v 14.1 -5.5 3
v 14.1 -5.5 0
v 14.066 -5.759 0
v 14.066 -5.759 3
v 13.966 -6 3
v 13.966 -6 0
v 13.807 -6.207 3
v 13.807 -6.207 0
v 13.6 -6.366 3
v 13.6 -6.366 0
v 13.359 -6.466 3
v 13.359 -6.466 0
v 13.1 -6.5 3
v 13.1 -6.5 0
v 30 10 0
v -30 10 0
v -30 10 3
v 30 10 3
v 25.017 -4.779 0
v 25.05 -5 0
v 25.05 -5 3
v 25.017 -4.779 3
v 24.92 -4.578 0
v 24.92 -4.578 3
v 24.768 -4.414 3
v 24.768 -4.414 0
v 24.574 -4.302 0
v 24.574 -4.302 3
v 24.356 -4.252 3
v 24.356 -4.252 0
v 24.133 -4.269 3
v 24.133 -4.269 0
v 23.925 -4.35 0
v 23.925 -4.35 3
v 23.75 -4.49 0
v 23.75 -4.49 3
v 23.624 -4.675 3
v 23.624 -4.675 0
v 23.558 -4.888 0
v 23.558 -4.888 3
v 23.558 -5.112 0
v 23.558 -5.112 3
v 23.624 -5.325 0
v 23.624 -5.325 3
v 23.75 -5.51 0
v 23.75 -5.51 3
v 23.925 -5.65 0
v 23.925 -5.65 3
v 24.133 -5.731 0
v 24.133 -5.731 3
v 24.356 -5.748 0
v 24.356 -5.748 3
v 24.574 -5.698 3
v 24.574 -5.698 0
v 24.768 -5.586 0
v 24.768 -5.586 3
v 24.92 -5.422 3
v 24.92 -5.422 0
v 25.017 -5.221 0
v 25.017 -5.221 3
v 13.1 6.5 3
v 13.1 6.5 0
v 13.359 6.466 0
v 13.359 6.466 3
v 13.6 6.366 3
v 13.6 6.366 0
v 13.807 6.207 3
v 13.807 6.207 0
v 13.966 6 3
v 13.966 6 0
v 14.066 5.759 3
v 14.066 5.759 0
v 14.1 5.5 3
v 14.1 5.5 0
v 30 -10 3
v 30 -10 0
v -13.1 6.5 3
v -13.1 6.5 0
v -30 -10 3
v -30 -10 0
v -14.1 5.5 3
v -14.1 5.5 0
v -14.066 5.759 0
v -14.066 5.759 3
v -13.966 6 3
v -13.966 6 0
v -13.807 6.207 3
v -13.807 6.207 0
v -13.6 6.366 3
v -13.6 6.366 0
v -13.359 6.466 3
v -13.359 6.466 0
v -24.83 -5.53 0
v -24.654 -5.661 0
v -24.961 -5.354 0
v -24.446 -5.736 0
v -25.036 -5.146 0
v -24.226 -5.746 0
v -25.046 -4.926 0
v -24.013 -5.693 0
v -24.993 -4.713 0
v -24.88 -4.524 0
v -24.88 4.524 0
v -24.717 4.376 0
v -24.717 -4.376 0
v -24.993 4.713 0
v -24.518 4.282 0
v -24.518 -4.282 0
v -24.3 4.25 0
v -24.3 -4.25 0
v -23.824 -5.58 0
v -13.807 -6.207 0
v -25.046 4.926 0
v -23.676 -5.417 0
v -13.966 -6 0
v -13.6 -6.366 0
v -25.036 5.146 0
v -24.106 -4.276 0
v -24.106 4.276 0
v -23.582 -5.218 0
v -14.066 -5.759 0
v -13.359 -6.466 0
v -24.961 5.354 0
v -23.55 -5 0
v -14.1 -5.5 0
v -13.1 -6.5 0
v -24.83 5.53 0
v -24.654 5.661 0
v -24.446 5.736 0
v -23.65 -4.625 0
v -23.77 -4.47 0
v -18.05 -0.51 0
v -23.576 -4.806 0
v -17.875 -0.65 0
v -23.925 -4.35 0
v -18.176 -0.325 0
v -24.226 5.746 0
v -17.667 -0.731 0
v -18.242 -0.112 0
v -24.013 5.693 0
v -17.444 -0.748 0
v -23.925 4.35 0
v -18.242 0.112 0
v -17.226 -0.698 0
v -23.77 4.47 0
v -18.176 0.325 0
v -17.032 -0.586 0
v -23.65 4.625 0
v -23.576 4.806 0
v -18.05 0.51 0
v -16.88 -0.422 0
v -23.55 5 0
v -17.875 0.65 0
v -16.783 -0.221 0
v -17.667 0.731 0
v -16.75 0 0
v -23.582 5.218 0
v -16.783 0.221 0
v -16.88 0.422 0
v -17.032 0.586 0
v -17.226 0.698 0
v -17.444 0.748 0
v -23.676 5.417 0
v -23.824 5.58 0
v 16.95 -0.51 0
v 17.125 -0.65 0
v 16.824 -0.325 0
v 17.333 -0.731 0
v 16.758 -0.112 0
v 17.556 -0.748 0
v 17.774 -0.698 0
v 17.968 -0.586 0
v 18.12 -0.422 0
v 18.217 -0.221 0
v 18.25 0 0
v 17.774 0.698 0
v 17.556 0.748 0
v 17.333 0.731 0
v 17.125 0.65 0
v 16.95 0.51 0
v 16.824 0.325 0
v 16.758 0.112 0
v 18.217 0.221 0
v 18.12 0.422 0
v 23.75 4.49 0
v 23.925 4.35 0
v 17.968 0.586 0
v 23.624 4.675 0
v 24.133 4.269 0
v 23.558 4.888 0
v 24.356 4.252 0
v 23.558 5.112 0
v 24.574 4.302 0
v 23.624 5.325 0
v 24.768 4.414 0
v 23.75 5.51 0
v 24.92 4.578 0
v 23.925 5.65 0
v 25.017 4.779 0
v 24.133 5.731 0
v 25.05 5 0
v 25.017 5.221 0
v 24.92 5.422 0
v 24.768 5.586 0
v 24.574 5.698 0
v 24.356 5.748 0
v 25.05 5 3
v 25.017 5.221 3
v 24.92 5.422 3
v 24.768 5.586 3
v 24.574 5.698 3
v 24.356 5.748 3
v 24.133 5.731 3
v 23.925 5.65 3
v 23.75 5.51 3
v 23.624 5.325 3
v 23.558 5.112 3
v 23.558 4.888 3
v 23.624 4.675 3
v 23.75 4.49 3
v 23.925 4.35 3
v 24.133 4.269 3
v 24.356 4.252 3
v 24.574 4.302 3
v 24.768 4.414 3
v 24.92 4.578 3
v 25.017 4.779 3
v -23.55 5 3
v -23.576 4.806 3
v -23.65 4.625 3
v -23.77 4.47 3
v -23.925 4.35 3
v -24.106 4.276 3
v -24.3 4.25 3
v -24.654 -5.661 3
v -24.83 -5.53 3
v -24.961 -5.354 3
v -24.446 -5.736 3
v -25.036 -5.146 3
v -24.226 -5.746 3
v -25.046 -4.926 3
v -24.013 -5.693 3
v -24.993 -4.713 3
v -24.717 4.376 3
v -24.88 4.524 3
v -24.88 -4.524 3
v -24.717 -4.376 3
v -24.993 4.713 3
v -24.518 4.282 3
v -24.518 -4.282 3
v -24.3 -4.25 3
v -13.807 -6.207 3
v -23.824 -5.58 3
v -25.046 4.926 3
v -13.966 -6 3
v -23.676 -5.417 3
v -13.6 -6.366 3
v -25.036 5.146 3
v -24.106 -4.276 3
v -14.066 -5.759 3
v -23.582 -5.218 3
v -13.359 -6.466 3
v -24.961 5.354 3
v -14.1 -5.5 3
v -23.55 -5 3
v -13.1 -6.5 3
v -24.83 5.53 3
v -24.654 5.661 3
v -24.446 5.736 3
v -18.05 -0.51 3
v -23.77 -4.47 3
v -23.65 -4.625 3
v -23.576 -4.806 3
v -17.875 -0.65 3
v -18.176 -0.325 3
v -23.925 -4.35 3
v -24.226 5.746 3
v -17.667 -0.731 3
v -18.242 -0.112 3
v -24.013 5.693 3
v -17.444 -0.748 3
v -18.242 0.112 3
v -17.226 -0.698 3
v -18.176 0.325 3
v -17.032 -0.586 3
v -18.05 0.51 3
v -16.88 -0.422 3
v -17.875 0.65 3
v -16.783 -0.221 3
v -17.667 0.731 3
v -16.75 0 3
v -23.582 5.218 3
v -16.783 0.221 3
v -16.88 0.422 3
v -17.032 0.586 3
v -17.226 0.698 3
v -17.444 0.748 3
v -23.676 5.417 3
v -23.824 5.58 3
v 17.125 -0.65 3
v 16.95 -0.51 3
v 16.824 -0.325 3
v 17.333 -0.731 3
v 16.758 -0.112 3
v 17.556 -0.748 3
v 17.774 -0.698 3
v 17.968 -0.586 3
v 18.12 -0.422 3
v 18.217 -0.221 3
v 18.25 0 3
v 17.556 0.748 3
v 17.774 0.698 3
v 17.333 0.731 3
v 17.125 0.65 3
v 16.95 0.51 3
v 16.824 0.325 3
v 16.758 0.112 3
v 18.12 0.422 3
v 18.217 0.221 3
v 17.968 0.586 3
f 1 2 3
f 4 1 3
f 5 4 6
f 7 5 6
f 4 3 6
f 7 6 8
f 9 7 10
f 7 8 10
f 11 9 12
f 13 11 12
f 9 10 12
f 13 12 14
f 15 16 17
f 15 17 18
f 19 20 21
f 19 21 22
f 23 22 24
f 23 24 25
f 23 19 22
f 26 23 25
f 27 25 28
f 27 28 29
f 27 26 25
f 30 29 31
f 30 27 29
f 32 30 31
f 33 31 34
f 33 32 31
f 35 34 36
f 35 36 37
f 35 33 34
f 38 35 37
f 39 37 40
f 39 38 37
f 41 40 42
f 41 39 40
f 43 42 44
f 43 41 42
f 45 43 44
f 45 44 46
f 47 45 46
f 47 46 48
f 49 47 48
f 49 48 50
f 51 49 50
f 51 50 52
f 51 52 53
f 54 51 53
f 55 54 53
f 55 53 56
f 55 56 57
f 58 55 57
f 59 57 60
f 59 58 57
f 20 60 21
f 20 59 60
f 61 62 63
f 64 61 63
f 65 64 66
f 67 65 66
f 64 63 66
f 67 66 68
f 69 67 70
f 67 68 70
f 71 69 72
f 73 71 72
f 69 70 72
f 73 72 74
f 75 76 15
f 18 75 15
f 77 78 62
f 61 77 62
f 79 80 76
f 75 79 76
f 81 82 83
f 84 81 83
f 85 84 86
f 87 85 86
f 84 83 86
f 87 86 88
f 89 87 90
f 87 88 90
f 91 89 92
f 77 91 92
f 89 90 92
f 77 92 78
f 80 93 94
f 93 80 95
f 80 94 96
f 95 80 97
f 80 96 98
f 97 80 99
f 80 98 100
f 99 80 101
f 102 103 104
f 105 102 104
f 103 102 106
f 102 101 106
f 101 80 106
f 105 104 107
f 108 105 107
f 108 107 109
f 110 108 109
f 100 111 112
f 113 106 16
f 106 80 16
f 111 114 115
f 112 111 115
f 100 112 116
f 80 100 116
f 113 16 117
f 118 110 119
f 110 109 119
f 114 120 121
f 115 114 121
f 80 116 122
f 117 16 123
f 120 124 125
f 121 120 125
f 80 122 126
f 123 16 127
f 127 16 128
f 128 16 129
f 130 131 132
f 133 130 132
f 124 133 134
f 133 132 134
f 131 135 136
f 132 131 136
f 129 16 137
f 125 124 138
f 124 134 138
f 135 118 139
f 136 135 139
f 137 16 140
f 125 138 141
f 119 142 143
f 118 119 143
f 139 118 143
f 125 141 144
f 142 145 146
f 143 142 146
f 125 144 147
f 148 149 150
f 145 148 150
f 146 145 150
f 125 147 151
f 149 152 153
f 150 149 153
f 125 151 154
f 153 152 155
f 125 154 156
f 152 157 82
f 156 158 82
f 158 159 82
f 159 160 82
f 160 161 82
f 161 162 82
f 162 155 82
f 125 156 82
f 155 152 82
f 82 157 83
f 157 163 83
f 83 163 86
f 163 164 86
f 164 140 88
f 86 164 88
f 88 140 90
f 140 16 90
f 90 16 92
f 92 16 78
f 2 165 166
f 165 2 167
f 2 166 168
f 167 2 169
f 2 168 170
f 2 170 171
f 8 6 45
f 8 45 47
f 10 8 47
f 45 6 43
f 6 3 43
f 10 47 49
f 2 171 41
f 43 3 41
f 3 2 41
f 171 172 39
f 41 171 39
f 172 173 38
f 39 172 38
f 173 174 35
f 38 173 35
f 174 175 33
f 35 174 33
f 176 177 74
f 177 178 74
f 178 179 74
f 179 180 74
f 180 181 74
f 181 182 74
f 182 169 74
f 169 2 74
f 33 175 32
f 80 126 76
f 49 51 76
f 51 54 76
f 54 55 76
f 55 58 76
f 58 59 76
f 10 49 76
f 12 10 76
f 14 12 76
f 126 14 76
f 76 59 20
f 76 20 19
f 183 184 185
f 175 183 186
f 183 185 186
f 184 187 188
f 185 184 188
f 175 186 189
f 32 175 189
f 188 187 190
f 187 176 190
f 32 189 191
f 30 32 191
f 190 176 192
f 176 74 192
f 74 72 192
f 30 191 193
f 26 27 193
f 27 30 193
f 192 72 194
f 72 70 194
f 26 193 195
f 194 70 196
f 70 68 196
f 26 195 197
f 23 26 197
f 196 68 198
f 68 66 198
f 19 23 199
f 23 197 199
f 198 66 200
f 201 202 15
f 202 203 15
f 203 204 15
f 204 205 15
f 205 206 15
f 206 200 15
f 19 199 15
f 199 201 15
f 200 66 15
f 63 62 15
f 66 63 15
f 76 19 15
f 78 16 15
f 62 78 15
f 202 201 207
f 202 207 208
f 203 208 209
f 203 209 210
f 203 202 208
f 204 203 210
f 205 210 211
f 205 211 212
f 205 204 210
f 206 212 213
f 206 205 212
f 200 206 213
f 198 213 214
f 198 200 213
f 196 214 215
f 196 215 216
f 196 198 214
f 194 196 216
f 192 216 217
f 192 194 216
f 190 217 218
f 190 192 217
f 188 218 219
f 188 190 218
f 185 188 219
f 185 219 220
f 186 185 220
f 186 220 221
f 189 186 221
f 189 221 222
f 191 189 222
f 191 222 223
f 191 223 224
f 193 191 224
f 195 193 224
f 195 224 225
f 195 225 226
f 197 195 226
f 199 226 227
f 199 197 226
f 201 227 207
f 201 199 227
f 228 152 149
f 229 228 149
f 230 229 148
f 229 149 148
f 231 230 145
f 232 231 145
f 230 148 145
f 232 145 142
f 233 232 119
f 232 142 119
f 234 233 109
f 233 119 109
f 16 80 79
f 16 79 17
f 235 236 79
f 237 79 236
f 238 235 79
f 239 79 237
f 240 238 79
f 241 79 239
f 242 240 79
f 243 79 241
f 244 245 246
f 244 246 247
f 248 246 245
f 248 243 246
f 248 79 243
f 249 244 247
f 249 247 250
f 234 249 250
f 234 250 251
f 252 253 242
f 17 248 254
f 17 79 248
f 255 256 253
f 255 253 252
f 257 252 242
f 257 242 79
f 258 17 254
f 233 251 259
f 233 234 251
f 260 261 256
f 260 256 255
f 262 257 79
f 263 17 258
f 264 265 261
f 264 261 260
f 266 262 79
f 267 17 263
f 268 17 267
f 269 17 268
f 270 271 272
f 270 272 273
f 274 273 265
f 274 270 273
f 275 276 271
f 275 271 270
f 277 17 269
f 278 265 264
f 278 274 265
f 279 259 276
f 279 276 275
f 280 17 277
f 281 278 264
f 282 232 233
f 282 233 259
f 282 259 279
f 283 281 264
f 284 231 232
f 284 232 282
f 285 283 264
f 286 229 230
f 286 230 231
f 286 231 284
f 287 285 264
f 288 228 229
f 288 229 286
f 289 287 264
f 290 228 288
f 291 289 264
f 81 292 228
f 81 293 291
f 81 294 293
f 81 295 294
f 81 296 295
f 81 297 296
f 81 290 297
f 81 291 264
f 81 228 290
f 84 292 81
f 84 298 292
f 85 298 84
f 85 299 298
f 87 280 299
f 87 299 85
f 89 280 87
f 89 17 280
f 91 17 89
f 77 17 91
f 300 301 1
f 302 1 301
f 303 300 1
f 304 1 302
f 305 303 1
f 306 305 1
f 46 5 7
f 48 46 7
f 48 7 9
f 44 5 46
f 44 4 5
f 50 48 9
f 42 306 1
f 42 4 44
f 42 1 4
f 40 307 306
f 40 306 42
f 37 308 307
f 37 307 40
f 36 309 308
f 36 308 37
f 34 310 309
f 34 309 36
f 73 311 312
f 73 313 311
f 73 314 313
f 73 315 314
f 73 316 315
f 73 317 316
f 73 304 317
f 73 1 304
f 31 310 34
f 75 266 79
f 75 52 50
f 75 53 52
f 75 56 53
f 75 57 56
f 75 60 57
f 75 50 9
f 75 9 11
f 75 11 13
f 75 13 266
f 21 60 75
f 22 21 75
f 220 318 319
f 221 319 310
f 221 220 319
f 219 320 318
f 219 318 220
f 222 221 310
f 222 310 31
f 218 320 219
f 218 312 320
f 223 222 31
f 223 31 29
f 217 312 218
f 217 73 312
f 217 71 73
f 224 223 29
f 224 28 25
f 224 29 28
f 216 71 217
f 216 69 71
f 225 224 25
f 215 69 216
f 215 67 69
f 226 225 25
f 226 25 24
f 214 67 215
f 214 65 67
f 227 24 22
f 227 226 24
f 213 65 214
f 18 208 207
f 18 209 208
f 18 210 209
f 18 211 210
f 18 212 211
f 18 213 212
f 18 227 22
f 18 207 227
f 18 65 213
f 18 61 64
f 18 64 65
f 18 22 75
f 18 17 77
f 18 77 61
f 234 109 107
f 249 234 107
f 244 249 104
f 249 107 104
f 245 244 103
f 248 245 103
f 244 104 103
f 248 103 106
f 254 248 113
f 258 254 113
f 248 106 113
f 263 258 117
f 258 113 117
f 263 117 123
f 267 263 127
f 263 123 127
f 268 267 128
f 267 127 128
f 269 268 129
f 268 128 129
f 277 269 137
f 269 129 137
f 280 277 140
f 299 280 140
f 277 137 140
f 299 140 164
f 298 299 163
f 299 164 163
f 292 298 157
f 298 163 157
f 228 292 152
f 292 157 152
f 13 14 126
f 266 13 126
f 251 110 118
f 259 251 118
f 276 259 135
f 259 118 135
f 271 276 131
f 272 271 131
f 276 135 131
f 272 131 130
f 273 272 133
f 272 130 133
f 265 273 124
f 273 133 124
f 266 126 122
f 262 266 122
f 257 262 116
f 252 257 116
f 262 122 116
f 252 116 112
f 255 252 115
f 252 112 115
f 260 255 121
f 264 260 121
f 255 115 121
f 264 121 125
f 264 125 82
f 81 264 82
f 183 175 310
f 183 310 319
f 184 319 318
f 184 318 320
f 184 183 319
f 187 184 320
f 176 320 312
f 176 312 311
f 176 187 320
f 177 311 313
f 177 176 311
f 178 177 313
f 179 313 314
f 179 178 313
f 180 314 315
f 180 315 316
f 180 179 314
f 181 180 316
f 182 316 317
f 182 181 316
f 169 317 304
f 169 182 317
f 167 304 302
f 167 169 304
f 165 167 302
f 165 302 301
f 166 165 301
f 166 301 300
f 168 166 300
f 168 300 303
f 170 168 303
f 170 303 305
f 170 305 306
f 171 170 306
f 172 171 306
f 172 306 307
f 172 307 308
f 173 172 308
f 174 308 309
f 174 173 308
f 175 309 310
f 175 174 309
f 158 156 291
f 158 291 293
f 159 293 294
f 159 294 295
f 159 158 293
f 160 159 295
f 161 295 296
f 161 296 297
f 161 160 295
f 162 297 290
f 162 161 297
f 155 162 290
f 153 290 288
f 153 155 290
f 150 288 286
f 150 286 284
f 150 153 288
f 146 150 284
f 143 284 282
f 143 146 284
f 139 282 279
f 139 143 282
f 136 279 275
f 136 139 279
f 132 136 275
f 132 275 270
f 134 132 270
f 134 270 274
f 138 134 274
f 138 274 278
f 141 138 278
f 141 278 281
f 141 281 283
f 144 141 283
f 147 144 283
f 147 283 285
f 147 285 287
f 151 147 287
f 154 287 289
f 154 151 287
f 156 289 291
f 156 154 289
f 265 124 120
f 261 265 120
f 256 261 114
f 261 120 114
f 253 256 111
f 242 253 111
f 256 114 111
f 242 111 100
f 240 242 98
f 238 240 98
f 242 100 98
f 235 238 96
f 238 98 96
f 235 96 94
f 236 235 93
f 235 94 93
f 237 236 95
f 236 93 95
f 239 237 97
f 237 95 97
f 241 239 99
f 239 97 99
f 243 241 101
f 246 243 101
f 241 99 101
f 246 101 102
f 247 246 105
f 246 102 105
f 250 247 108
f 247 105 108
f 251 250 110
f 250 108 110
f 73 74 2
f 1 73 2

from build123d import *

# Parameters (mm, degrees)
F0_W     = 60
F0_H     = 20
F0_R     = 0.75
F1_DEPTH = 3


with BuildPart() as f1:
    # F0 (on Top) → F1 (new body)
    with BuildSketch(Plane.XY):
        Rectangle(F0_W, F0_H)
        with BuildLine():
            ThreePointArc((-23.55, -5), (-24.83033, -5.53033), (-24.3, -4.25))
            ThreePointArc((-24.3, -4.25), (-23.76967, -4.46967), (-23.55, -5))
        make_face(mode=Mode.SUBTRACT)
        with Locations((24.3, -5)):
            Circle(F0_R, mode=Mode.SUBTRACT)
        with Locations((-17.5, 0)):
            Circle(F0_R, mode=Mode.SUBTRACT)
        with BuildLine():
            ThreePointArc((-23.55, 5), (-23.76967, 4.46967), (-24.3, 4.25))
            ThreePointArc((-24.3, 4.25), (-24.83033, 5.53033), (-23.55, 5))
        make_face(mode=Mode.SUBTRACT)
        with BuildLine():
            ThreePointArc((-14.1, 5.5), (-13.807107, 6.207107), (-13.1, 6.5))
            Line((-13.1, 6.5), (13.1, 6.5))
            ThreePointArc((13.1, 6.5), (13.807107, 6.207107), (14.1, 5.5))
            Line((14.1, 5.5), (14.1, -5.5))
            ThreePointArc((14.1, -5.5), (13.807107, -6.207107), (13.1, -6.5))
            Line((13.1, -6.5), (-13.1, -6.5))
            ThreePointArc((-13.1, -6.5), (-13.807107, -6.207107), (-14.1, -5.5))
            Line((-14.1, -5.5), (-14.1, 5.5))
        make_face(mode=Mode.SUBTRACT)
        with Locations((17.5, 0)):
            Circle(F0_R, mode=Mode.SUBTRACT)
        with Locations((24.3, 5)):
            Circle(F0_R, mode=Mode.SUBTRACT)
    extrude(amount=F1_DEPTH)


solid = f1.part
